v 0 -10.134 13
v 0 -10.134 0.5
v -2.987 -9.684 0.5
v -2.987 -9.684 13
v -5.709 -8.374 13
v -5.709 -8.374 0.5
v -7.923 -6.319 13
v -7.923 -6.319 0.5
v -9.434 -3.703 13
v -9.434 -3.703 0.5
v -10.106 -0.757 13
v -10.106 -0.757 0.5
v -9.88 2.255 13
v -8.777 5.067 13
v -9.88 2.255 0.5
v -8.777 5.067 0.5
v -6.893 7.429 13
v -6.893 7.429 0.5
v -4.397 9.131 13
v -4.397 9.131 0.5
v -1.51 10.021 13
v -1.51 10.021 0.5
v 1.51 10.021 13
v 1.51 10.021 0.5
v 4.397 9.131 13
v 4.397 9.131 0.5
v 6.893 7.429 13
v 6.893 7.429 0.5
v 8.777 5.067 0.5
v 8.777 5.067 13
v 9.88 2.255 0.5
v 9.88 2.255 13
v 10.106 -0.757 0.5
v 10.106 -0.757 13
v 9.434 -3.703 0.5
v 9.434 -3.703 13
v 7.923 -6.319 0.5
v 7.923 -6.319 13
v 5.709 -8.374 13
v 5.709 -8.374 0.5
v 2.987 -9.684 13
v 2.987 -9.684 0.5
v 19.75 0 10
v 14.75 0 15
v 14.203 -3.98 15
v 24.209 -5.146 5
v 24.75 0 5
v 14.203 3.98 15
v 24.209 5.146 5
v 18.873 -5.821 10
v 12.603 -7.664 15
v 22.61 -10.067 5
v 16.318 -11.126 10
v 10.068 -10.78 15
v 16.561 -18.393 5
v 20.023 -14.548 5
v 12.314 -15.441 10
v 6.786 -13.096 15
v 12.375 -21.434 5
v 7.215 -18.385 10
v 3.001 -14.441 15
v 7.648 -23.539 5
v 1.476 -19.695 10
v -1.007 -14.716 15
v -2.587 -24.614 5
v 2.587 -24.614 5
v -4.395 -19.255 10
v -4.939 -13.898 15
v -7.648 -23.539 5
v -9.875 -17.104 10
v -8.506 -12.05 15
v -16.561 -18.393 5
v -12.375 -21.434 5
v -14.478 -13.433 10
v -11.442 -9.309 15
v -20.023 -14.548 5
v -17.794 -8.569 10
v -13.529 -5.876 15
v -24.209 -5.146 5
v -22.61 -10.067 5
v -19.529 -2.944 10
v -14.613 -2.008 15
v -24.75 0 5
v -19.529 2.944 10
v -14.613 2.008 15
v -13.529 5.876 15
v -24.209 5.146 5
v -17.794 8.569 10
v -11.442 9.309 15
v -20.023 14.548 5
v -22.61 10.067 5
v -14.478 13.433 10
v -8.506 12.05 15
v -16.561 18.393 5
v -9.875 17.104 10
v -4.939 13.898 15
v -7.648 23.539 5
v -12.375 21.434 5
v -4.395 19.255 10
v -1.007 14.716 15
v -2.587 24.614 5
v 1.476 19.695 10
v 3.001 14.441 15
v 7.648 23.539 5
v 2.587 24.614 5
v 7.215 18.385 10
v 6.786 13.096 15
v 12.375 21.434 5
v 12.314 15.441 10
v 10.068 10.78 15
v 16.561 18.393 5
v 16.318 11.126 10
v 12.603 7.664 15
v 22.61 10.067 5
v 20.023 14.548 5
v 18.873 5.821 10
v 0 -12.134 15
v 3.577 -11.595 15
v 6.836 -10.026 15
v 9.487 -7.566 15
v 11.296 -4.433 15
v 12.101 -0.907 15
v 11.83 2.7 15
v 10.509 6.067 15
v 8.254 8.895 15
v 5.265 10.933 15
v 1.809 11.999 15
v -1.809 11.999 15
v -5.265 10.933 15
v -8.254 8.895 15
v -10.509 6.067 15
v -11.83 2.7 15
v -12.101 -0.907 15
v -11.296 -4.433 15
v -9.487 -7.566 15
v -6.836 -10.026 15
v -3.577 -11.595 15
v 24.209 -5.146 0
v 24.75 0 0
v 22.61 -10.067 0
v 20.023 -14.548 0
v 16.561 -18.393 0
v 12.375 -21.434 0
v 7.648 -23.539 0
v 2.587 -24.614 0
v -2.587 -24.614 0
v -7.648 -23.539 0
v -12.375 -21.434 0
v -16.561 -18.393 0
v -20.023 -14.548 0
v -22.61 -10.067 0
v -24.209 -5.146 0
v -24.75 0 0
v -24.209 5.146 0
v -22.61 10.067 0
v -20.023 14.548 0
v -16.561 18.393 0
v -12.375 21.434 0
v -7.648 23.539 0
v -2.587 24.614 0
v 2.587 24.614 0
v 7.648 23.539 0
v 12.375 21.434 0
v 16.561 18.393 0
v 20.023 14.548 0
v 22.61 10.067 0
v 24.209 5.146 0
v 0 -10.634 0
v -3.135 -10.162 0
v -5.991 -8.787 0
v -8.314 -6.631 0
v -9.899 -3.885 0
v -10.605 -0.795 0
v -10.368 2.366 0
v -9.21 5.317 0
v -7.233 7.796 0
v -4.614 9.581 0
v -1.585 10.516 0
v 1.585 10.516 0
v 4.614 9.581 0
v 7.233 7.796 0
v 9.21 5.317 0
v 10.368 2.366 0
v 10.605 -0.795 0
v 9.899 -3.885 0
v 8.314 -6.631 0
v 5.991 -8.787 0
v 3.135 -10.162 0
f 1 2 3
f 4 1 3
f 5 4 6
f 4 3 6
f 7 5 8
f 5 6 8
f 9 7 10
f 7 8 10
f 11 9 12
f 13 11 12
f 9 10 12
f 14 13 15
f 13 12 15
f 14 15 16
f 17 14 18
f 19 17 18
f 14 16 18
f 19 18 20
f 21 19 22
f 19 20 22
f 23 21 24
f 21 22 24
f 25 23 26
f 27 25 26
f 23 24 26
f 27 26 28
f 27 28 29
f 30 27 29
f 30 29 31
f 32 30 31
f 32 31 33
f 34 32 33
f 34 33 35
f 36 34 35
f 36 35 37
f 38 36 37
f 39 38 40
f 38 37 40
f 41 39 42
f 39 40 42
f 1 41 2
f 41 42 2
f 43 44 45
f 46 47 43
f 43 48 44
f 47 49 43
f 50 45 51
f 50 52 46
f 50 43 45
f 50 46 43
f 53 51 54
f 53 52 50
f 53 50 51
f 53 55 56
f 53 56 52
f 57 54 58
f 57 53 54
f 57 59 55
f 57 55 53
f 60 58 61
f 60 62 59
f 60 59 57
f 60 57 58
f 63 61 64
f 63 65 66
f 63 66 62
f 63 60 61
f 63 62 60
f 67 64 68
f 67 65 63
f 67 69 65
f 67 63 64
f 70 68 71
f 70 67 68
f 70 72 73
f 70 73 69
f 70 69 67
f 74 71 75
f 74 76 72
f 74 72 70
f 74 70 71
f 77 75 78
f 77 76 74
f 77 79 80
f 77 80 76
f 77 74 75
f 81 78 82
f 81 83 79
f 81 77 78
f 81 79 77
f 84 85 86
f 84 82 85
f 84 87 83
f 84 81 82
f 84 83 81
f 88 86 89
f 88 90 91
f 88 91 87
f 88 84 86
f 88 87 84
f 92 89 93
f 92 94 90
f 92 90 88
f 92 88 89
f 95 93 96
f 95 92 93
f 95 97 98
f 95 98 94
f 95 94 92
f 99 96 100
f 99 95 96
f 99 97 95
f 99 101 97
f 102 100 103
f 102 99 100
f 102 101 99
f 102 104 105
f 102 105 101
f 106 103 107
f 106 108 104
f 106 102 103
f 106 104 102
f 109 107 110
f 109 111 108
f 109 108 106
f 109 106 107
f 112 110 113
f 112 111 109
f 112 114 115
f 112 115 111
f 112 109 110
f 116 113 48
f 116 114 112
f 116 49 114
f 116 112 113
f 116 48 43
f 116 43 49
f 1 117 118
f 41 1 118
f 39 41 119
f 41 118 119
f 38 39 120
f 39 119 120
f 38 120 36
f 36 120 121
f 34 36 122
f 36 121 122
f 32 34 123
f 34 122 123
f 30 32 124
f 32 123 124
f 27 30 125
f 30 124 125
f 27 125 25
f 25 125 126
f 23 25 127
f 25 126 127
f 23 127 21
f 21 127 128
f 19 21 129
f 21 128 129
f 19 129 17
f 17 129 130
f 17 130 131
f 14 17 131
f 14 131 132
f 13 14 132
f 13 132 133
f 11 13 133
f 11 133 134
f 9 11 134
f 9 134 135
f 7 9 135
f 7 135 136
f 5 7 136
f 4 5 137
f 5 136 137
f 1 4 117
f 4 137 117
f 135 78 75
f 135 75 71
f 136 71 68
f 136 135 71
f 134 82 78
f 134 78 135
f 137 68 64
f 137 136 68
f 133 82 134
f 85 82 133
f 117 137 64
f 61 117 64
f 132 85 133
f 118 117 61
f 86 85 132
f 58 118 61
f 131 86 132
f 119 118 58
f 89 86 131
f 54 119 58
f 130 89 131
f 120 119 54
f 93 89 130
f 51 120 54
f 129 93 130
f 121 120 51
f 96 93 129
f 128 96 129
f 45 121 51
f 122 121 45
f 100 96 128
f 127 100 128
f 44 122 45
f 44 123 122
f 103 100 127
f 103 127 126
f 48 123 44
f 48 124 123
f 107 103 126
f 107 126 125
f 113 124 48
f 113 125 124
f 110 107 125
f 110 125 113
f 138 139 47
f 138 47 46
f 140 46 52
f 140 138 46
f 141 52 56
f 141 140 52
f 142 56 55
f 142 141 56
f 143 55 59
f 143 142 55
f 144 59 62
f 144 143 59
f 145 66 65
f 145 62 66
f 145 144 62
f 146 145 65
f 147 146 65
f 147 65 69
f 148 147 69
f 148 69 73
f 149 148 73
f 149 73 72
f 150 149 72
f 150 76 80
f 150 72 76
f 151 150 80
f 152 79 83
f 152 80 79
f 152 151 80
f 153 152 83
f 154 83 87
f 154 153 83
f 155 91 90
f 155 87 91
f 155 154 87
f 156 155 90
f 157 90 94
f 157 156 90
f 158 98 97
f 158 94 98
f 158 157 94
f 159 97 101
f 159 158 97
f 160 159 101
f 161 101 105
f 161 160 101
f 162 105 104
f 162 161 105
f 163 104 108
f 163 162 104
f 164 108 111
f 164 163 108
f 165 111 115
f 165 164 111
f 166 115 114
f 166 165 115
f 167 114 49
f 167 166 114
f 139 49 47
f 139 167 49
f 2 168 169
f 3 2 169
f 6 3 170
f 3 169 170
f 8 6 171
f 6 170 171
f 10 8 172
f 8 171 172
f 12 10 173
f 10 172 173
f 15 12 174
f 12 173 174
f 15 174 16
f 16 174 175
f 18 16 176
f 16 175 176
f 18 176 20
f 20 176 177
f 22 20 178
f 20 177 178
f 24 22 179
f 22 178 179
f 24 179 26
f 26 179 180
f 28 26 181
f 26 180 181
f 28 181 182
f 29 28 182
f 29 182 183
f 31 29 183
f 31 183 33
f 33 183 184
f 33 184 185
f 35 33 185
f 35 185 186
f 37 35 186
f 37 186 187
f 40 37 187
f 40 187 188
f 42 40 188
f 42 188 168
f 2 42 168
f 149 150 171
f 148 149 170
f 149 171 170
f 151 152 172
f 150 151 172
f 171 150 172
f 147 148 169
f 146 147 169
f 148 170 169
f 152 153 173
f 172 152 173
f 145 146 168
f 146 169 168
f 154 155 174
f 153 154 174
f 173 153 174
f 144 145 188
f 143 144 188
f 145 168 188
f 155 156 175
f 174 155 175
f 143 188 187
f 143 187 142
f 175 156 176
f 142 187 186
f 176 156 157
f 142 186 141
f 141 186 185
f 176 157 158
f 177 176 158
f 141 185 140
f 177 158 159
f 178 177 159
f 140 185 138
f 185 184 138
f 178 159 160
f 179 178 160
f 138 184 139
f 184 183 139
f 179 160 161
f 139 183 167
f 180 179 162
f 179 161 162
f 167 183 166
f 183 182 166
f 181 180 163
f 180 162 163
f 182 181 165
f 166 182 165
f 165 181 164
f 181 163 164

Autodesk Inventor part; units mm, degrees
ref_plane "YZ Plane" through (0, 0, 0) normal (1, 0, 0) x (0, 1, 0)
ref_plane "XZ Plane" through (0, 0, 0) normal (0, 1, 0) x (-1, 0, 0)
ref_plane "XY Plane" through (0, 0, 0) normal (0, 0, 1) x (1, 0, 0)
sketch "Sketch1" plane through (0, 0, 0) normal (0, 0, 1) x (1, 0, 0)
  circle A0 centre (0, 0) radius 24.75
  dimension "d0" = 49.5
extrude "Extrusion1" add sketch "Sketch1" along normal blind 15
sketch "Sketch2" plane through (0, 0, 15) normal (0, 0, 1) x (1, 0, 0)
  circle A0 centre (0, 0) radius 24.75 projected
hole "Hole1" at (0, 0, 15) direction (0, 0, -1) diameter 20.269 depth 15 tip angle 118 thread size "7/8-14 UNF" class "2B" standard "ANSI Unified Screw Threads"
chamfer "Chamfer1" distance 10 angle 45 1 edges at (-24.75, 0, 15)
chamfer "Chamfer2" distance 2 angle 45 1 edges at (0, 10.1345, 15)
chamfer "Chamfer3" distance 0.5 angle 45 1 edges at (0, 10.1345, 0)
properties part number "LUVA(24)" material "Carbon Steel"
